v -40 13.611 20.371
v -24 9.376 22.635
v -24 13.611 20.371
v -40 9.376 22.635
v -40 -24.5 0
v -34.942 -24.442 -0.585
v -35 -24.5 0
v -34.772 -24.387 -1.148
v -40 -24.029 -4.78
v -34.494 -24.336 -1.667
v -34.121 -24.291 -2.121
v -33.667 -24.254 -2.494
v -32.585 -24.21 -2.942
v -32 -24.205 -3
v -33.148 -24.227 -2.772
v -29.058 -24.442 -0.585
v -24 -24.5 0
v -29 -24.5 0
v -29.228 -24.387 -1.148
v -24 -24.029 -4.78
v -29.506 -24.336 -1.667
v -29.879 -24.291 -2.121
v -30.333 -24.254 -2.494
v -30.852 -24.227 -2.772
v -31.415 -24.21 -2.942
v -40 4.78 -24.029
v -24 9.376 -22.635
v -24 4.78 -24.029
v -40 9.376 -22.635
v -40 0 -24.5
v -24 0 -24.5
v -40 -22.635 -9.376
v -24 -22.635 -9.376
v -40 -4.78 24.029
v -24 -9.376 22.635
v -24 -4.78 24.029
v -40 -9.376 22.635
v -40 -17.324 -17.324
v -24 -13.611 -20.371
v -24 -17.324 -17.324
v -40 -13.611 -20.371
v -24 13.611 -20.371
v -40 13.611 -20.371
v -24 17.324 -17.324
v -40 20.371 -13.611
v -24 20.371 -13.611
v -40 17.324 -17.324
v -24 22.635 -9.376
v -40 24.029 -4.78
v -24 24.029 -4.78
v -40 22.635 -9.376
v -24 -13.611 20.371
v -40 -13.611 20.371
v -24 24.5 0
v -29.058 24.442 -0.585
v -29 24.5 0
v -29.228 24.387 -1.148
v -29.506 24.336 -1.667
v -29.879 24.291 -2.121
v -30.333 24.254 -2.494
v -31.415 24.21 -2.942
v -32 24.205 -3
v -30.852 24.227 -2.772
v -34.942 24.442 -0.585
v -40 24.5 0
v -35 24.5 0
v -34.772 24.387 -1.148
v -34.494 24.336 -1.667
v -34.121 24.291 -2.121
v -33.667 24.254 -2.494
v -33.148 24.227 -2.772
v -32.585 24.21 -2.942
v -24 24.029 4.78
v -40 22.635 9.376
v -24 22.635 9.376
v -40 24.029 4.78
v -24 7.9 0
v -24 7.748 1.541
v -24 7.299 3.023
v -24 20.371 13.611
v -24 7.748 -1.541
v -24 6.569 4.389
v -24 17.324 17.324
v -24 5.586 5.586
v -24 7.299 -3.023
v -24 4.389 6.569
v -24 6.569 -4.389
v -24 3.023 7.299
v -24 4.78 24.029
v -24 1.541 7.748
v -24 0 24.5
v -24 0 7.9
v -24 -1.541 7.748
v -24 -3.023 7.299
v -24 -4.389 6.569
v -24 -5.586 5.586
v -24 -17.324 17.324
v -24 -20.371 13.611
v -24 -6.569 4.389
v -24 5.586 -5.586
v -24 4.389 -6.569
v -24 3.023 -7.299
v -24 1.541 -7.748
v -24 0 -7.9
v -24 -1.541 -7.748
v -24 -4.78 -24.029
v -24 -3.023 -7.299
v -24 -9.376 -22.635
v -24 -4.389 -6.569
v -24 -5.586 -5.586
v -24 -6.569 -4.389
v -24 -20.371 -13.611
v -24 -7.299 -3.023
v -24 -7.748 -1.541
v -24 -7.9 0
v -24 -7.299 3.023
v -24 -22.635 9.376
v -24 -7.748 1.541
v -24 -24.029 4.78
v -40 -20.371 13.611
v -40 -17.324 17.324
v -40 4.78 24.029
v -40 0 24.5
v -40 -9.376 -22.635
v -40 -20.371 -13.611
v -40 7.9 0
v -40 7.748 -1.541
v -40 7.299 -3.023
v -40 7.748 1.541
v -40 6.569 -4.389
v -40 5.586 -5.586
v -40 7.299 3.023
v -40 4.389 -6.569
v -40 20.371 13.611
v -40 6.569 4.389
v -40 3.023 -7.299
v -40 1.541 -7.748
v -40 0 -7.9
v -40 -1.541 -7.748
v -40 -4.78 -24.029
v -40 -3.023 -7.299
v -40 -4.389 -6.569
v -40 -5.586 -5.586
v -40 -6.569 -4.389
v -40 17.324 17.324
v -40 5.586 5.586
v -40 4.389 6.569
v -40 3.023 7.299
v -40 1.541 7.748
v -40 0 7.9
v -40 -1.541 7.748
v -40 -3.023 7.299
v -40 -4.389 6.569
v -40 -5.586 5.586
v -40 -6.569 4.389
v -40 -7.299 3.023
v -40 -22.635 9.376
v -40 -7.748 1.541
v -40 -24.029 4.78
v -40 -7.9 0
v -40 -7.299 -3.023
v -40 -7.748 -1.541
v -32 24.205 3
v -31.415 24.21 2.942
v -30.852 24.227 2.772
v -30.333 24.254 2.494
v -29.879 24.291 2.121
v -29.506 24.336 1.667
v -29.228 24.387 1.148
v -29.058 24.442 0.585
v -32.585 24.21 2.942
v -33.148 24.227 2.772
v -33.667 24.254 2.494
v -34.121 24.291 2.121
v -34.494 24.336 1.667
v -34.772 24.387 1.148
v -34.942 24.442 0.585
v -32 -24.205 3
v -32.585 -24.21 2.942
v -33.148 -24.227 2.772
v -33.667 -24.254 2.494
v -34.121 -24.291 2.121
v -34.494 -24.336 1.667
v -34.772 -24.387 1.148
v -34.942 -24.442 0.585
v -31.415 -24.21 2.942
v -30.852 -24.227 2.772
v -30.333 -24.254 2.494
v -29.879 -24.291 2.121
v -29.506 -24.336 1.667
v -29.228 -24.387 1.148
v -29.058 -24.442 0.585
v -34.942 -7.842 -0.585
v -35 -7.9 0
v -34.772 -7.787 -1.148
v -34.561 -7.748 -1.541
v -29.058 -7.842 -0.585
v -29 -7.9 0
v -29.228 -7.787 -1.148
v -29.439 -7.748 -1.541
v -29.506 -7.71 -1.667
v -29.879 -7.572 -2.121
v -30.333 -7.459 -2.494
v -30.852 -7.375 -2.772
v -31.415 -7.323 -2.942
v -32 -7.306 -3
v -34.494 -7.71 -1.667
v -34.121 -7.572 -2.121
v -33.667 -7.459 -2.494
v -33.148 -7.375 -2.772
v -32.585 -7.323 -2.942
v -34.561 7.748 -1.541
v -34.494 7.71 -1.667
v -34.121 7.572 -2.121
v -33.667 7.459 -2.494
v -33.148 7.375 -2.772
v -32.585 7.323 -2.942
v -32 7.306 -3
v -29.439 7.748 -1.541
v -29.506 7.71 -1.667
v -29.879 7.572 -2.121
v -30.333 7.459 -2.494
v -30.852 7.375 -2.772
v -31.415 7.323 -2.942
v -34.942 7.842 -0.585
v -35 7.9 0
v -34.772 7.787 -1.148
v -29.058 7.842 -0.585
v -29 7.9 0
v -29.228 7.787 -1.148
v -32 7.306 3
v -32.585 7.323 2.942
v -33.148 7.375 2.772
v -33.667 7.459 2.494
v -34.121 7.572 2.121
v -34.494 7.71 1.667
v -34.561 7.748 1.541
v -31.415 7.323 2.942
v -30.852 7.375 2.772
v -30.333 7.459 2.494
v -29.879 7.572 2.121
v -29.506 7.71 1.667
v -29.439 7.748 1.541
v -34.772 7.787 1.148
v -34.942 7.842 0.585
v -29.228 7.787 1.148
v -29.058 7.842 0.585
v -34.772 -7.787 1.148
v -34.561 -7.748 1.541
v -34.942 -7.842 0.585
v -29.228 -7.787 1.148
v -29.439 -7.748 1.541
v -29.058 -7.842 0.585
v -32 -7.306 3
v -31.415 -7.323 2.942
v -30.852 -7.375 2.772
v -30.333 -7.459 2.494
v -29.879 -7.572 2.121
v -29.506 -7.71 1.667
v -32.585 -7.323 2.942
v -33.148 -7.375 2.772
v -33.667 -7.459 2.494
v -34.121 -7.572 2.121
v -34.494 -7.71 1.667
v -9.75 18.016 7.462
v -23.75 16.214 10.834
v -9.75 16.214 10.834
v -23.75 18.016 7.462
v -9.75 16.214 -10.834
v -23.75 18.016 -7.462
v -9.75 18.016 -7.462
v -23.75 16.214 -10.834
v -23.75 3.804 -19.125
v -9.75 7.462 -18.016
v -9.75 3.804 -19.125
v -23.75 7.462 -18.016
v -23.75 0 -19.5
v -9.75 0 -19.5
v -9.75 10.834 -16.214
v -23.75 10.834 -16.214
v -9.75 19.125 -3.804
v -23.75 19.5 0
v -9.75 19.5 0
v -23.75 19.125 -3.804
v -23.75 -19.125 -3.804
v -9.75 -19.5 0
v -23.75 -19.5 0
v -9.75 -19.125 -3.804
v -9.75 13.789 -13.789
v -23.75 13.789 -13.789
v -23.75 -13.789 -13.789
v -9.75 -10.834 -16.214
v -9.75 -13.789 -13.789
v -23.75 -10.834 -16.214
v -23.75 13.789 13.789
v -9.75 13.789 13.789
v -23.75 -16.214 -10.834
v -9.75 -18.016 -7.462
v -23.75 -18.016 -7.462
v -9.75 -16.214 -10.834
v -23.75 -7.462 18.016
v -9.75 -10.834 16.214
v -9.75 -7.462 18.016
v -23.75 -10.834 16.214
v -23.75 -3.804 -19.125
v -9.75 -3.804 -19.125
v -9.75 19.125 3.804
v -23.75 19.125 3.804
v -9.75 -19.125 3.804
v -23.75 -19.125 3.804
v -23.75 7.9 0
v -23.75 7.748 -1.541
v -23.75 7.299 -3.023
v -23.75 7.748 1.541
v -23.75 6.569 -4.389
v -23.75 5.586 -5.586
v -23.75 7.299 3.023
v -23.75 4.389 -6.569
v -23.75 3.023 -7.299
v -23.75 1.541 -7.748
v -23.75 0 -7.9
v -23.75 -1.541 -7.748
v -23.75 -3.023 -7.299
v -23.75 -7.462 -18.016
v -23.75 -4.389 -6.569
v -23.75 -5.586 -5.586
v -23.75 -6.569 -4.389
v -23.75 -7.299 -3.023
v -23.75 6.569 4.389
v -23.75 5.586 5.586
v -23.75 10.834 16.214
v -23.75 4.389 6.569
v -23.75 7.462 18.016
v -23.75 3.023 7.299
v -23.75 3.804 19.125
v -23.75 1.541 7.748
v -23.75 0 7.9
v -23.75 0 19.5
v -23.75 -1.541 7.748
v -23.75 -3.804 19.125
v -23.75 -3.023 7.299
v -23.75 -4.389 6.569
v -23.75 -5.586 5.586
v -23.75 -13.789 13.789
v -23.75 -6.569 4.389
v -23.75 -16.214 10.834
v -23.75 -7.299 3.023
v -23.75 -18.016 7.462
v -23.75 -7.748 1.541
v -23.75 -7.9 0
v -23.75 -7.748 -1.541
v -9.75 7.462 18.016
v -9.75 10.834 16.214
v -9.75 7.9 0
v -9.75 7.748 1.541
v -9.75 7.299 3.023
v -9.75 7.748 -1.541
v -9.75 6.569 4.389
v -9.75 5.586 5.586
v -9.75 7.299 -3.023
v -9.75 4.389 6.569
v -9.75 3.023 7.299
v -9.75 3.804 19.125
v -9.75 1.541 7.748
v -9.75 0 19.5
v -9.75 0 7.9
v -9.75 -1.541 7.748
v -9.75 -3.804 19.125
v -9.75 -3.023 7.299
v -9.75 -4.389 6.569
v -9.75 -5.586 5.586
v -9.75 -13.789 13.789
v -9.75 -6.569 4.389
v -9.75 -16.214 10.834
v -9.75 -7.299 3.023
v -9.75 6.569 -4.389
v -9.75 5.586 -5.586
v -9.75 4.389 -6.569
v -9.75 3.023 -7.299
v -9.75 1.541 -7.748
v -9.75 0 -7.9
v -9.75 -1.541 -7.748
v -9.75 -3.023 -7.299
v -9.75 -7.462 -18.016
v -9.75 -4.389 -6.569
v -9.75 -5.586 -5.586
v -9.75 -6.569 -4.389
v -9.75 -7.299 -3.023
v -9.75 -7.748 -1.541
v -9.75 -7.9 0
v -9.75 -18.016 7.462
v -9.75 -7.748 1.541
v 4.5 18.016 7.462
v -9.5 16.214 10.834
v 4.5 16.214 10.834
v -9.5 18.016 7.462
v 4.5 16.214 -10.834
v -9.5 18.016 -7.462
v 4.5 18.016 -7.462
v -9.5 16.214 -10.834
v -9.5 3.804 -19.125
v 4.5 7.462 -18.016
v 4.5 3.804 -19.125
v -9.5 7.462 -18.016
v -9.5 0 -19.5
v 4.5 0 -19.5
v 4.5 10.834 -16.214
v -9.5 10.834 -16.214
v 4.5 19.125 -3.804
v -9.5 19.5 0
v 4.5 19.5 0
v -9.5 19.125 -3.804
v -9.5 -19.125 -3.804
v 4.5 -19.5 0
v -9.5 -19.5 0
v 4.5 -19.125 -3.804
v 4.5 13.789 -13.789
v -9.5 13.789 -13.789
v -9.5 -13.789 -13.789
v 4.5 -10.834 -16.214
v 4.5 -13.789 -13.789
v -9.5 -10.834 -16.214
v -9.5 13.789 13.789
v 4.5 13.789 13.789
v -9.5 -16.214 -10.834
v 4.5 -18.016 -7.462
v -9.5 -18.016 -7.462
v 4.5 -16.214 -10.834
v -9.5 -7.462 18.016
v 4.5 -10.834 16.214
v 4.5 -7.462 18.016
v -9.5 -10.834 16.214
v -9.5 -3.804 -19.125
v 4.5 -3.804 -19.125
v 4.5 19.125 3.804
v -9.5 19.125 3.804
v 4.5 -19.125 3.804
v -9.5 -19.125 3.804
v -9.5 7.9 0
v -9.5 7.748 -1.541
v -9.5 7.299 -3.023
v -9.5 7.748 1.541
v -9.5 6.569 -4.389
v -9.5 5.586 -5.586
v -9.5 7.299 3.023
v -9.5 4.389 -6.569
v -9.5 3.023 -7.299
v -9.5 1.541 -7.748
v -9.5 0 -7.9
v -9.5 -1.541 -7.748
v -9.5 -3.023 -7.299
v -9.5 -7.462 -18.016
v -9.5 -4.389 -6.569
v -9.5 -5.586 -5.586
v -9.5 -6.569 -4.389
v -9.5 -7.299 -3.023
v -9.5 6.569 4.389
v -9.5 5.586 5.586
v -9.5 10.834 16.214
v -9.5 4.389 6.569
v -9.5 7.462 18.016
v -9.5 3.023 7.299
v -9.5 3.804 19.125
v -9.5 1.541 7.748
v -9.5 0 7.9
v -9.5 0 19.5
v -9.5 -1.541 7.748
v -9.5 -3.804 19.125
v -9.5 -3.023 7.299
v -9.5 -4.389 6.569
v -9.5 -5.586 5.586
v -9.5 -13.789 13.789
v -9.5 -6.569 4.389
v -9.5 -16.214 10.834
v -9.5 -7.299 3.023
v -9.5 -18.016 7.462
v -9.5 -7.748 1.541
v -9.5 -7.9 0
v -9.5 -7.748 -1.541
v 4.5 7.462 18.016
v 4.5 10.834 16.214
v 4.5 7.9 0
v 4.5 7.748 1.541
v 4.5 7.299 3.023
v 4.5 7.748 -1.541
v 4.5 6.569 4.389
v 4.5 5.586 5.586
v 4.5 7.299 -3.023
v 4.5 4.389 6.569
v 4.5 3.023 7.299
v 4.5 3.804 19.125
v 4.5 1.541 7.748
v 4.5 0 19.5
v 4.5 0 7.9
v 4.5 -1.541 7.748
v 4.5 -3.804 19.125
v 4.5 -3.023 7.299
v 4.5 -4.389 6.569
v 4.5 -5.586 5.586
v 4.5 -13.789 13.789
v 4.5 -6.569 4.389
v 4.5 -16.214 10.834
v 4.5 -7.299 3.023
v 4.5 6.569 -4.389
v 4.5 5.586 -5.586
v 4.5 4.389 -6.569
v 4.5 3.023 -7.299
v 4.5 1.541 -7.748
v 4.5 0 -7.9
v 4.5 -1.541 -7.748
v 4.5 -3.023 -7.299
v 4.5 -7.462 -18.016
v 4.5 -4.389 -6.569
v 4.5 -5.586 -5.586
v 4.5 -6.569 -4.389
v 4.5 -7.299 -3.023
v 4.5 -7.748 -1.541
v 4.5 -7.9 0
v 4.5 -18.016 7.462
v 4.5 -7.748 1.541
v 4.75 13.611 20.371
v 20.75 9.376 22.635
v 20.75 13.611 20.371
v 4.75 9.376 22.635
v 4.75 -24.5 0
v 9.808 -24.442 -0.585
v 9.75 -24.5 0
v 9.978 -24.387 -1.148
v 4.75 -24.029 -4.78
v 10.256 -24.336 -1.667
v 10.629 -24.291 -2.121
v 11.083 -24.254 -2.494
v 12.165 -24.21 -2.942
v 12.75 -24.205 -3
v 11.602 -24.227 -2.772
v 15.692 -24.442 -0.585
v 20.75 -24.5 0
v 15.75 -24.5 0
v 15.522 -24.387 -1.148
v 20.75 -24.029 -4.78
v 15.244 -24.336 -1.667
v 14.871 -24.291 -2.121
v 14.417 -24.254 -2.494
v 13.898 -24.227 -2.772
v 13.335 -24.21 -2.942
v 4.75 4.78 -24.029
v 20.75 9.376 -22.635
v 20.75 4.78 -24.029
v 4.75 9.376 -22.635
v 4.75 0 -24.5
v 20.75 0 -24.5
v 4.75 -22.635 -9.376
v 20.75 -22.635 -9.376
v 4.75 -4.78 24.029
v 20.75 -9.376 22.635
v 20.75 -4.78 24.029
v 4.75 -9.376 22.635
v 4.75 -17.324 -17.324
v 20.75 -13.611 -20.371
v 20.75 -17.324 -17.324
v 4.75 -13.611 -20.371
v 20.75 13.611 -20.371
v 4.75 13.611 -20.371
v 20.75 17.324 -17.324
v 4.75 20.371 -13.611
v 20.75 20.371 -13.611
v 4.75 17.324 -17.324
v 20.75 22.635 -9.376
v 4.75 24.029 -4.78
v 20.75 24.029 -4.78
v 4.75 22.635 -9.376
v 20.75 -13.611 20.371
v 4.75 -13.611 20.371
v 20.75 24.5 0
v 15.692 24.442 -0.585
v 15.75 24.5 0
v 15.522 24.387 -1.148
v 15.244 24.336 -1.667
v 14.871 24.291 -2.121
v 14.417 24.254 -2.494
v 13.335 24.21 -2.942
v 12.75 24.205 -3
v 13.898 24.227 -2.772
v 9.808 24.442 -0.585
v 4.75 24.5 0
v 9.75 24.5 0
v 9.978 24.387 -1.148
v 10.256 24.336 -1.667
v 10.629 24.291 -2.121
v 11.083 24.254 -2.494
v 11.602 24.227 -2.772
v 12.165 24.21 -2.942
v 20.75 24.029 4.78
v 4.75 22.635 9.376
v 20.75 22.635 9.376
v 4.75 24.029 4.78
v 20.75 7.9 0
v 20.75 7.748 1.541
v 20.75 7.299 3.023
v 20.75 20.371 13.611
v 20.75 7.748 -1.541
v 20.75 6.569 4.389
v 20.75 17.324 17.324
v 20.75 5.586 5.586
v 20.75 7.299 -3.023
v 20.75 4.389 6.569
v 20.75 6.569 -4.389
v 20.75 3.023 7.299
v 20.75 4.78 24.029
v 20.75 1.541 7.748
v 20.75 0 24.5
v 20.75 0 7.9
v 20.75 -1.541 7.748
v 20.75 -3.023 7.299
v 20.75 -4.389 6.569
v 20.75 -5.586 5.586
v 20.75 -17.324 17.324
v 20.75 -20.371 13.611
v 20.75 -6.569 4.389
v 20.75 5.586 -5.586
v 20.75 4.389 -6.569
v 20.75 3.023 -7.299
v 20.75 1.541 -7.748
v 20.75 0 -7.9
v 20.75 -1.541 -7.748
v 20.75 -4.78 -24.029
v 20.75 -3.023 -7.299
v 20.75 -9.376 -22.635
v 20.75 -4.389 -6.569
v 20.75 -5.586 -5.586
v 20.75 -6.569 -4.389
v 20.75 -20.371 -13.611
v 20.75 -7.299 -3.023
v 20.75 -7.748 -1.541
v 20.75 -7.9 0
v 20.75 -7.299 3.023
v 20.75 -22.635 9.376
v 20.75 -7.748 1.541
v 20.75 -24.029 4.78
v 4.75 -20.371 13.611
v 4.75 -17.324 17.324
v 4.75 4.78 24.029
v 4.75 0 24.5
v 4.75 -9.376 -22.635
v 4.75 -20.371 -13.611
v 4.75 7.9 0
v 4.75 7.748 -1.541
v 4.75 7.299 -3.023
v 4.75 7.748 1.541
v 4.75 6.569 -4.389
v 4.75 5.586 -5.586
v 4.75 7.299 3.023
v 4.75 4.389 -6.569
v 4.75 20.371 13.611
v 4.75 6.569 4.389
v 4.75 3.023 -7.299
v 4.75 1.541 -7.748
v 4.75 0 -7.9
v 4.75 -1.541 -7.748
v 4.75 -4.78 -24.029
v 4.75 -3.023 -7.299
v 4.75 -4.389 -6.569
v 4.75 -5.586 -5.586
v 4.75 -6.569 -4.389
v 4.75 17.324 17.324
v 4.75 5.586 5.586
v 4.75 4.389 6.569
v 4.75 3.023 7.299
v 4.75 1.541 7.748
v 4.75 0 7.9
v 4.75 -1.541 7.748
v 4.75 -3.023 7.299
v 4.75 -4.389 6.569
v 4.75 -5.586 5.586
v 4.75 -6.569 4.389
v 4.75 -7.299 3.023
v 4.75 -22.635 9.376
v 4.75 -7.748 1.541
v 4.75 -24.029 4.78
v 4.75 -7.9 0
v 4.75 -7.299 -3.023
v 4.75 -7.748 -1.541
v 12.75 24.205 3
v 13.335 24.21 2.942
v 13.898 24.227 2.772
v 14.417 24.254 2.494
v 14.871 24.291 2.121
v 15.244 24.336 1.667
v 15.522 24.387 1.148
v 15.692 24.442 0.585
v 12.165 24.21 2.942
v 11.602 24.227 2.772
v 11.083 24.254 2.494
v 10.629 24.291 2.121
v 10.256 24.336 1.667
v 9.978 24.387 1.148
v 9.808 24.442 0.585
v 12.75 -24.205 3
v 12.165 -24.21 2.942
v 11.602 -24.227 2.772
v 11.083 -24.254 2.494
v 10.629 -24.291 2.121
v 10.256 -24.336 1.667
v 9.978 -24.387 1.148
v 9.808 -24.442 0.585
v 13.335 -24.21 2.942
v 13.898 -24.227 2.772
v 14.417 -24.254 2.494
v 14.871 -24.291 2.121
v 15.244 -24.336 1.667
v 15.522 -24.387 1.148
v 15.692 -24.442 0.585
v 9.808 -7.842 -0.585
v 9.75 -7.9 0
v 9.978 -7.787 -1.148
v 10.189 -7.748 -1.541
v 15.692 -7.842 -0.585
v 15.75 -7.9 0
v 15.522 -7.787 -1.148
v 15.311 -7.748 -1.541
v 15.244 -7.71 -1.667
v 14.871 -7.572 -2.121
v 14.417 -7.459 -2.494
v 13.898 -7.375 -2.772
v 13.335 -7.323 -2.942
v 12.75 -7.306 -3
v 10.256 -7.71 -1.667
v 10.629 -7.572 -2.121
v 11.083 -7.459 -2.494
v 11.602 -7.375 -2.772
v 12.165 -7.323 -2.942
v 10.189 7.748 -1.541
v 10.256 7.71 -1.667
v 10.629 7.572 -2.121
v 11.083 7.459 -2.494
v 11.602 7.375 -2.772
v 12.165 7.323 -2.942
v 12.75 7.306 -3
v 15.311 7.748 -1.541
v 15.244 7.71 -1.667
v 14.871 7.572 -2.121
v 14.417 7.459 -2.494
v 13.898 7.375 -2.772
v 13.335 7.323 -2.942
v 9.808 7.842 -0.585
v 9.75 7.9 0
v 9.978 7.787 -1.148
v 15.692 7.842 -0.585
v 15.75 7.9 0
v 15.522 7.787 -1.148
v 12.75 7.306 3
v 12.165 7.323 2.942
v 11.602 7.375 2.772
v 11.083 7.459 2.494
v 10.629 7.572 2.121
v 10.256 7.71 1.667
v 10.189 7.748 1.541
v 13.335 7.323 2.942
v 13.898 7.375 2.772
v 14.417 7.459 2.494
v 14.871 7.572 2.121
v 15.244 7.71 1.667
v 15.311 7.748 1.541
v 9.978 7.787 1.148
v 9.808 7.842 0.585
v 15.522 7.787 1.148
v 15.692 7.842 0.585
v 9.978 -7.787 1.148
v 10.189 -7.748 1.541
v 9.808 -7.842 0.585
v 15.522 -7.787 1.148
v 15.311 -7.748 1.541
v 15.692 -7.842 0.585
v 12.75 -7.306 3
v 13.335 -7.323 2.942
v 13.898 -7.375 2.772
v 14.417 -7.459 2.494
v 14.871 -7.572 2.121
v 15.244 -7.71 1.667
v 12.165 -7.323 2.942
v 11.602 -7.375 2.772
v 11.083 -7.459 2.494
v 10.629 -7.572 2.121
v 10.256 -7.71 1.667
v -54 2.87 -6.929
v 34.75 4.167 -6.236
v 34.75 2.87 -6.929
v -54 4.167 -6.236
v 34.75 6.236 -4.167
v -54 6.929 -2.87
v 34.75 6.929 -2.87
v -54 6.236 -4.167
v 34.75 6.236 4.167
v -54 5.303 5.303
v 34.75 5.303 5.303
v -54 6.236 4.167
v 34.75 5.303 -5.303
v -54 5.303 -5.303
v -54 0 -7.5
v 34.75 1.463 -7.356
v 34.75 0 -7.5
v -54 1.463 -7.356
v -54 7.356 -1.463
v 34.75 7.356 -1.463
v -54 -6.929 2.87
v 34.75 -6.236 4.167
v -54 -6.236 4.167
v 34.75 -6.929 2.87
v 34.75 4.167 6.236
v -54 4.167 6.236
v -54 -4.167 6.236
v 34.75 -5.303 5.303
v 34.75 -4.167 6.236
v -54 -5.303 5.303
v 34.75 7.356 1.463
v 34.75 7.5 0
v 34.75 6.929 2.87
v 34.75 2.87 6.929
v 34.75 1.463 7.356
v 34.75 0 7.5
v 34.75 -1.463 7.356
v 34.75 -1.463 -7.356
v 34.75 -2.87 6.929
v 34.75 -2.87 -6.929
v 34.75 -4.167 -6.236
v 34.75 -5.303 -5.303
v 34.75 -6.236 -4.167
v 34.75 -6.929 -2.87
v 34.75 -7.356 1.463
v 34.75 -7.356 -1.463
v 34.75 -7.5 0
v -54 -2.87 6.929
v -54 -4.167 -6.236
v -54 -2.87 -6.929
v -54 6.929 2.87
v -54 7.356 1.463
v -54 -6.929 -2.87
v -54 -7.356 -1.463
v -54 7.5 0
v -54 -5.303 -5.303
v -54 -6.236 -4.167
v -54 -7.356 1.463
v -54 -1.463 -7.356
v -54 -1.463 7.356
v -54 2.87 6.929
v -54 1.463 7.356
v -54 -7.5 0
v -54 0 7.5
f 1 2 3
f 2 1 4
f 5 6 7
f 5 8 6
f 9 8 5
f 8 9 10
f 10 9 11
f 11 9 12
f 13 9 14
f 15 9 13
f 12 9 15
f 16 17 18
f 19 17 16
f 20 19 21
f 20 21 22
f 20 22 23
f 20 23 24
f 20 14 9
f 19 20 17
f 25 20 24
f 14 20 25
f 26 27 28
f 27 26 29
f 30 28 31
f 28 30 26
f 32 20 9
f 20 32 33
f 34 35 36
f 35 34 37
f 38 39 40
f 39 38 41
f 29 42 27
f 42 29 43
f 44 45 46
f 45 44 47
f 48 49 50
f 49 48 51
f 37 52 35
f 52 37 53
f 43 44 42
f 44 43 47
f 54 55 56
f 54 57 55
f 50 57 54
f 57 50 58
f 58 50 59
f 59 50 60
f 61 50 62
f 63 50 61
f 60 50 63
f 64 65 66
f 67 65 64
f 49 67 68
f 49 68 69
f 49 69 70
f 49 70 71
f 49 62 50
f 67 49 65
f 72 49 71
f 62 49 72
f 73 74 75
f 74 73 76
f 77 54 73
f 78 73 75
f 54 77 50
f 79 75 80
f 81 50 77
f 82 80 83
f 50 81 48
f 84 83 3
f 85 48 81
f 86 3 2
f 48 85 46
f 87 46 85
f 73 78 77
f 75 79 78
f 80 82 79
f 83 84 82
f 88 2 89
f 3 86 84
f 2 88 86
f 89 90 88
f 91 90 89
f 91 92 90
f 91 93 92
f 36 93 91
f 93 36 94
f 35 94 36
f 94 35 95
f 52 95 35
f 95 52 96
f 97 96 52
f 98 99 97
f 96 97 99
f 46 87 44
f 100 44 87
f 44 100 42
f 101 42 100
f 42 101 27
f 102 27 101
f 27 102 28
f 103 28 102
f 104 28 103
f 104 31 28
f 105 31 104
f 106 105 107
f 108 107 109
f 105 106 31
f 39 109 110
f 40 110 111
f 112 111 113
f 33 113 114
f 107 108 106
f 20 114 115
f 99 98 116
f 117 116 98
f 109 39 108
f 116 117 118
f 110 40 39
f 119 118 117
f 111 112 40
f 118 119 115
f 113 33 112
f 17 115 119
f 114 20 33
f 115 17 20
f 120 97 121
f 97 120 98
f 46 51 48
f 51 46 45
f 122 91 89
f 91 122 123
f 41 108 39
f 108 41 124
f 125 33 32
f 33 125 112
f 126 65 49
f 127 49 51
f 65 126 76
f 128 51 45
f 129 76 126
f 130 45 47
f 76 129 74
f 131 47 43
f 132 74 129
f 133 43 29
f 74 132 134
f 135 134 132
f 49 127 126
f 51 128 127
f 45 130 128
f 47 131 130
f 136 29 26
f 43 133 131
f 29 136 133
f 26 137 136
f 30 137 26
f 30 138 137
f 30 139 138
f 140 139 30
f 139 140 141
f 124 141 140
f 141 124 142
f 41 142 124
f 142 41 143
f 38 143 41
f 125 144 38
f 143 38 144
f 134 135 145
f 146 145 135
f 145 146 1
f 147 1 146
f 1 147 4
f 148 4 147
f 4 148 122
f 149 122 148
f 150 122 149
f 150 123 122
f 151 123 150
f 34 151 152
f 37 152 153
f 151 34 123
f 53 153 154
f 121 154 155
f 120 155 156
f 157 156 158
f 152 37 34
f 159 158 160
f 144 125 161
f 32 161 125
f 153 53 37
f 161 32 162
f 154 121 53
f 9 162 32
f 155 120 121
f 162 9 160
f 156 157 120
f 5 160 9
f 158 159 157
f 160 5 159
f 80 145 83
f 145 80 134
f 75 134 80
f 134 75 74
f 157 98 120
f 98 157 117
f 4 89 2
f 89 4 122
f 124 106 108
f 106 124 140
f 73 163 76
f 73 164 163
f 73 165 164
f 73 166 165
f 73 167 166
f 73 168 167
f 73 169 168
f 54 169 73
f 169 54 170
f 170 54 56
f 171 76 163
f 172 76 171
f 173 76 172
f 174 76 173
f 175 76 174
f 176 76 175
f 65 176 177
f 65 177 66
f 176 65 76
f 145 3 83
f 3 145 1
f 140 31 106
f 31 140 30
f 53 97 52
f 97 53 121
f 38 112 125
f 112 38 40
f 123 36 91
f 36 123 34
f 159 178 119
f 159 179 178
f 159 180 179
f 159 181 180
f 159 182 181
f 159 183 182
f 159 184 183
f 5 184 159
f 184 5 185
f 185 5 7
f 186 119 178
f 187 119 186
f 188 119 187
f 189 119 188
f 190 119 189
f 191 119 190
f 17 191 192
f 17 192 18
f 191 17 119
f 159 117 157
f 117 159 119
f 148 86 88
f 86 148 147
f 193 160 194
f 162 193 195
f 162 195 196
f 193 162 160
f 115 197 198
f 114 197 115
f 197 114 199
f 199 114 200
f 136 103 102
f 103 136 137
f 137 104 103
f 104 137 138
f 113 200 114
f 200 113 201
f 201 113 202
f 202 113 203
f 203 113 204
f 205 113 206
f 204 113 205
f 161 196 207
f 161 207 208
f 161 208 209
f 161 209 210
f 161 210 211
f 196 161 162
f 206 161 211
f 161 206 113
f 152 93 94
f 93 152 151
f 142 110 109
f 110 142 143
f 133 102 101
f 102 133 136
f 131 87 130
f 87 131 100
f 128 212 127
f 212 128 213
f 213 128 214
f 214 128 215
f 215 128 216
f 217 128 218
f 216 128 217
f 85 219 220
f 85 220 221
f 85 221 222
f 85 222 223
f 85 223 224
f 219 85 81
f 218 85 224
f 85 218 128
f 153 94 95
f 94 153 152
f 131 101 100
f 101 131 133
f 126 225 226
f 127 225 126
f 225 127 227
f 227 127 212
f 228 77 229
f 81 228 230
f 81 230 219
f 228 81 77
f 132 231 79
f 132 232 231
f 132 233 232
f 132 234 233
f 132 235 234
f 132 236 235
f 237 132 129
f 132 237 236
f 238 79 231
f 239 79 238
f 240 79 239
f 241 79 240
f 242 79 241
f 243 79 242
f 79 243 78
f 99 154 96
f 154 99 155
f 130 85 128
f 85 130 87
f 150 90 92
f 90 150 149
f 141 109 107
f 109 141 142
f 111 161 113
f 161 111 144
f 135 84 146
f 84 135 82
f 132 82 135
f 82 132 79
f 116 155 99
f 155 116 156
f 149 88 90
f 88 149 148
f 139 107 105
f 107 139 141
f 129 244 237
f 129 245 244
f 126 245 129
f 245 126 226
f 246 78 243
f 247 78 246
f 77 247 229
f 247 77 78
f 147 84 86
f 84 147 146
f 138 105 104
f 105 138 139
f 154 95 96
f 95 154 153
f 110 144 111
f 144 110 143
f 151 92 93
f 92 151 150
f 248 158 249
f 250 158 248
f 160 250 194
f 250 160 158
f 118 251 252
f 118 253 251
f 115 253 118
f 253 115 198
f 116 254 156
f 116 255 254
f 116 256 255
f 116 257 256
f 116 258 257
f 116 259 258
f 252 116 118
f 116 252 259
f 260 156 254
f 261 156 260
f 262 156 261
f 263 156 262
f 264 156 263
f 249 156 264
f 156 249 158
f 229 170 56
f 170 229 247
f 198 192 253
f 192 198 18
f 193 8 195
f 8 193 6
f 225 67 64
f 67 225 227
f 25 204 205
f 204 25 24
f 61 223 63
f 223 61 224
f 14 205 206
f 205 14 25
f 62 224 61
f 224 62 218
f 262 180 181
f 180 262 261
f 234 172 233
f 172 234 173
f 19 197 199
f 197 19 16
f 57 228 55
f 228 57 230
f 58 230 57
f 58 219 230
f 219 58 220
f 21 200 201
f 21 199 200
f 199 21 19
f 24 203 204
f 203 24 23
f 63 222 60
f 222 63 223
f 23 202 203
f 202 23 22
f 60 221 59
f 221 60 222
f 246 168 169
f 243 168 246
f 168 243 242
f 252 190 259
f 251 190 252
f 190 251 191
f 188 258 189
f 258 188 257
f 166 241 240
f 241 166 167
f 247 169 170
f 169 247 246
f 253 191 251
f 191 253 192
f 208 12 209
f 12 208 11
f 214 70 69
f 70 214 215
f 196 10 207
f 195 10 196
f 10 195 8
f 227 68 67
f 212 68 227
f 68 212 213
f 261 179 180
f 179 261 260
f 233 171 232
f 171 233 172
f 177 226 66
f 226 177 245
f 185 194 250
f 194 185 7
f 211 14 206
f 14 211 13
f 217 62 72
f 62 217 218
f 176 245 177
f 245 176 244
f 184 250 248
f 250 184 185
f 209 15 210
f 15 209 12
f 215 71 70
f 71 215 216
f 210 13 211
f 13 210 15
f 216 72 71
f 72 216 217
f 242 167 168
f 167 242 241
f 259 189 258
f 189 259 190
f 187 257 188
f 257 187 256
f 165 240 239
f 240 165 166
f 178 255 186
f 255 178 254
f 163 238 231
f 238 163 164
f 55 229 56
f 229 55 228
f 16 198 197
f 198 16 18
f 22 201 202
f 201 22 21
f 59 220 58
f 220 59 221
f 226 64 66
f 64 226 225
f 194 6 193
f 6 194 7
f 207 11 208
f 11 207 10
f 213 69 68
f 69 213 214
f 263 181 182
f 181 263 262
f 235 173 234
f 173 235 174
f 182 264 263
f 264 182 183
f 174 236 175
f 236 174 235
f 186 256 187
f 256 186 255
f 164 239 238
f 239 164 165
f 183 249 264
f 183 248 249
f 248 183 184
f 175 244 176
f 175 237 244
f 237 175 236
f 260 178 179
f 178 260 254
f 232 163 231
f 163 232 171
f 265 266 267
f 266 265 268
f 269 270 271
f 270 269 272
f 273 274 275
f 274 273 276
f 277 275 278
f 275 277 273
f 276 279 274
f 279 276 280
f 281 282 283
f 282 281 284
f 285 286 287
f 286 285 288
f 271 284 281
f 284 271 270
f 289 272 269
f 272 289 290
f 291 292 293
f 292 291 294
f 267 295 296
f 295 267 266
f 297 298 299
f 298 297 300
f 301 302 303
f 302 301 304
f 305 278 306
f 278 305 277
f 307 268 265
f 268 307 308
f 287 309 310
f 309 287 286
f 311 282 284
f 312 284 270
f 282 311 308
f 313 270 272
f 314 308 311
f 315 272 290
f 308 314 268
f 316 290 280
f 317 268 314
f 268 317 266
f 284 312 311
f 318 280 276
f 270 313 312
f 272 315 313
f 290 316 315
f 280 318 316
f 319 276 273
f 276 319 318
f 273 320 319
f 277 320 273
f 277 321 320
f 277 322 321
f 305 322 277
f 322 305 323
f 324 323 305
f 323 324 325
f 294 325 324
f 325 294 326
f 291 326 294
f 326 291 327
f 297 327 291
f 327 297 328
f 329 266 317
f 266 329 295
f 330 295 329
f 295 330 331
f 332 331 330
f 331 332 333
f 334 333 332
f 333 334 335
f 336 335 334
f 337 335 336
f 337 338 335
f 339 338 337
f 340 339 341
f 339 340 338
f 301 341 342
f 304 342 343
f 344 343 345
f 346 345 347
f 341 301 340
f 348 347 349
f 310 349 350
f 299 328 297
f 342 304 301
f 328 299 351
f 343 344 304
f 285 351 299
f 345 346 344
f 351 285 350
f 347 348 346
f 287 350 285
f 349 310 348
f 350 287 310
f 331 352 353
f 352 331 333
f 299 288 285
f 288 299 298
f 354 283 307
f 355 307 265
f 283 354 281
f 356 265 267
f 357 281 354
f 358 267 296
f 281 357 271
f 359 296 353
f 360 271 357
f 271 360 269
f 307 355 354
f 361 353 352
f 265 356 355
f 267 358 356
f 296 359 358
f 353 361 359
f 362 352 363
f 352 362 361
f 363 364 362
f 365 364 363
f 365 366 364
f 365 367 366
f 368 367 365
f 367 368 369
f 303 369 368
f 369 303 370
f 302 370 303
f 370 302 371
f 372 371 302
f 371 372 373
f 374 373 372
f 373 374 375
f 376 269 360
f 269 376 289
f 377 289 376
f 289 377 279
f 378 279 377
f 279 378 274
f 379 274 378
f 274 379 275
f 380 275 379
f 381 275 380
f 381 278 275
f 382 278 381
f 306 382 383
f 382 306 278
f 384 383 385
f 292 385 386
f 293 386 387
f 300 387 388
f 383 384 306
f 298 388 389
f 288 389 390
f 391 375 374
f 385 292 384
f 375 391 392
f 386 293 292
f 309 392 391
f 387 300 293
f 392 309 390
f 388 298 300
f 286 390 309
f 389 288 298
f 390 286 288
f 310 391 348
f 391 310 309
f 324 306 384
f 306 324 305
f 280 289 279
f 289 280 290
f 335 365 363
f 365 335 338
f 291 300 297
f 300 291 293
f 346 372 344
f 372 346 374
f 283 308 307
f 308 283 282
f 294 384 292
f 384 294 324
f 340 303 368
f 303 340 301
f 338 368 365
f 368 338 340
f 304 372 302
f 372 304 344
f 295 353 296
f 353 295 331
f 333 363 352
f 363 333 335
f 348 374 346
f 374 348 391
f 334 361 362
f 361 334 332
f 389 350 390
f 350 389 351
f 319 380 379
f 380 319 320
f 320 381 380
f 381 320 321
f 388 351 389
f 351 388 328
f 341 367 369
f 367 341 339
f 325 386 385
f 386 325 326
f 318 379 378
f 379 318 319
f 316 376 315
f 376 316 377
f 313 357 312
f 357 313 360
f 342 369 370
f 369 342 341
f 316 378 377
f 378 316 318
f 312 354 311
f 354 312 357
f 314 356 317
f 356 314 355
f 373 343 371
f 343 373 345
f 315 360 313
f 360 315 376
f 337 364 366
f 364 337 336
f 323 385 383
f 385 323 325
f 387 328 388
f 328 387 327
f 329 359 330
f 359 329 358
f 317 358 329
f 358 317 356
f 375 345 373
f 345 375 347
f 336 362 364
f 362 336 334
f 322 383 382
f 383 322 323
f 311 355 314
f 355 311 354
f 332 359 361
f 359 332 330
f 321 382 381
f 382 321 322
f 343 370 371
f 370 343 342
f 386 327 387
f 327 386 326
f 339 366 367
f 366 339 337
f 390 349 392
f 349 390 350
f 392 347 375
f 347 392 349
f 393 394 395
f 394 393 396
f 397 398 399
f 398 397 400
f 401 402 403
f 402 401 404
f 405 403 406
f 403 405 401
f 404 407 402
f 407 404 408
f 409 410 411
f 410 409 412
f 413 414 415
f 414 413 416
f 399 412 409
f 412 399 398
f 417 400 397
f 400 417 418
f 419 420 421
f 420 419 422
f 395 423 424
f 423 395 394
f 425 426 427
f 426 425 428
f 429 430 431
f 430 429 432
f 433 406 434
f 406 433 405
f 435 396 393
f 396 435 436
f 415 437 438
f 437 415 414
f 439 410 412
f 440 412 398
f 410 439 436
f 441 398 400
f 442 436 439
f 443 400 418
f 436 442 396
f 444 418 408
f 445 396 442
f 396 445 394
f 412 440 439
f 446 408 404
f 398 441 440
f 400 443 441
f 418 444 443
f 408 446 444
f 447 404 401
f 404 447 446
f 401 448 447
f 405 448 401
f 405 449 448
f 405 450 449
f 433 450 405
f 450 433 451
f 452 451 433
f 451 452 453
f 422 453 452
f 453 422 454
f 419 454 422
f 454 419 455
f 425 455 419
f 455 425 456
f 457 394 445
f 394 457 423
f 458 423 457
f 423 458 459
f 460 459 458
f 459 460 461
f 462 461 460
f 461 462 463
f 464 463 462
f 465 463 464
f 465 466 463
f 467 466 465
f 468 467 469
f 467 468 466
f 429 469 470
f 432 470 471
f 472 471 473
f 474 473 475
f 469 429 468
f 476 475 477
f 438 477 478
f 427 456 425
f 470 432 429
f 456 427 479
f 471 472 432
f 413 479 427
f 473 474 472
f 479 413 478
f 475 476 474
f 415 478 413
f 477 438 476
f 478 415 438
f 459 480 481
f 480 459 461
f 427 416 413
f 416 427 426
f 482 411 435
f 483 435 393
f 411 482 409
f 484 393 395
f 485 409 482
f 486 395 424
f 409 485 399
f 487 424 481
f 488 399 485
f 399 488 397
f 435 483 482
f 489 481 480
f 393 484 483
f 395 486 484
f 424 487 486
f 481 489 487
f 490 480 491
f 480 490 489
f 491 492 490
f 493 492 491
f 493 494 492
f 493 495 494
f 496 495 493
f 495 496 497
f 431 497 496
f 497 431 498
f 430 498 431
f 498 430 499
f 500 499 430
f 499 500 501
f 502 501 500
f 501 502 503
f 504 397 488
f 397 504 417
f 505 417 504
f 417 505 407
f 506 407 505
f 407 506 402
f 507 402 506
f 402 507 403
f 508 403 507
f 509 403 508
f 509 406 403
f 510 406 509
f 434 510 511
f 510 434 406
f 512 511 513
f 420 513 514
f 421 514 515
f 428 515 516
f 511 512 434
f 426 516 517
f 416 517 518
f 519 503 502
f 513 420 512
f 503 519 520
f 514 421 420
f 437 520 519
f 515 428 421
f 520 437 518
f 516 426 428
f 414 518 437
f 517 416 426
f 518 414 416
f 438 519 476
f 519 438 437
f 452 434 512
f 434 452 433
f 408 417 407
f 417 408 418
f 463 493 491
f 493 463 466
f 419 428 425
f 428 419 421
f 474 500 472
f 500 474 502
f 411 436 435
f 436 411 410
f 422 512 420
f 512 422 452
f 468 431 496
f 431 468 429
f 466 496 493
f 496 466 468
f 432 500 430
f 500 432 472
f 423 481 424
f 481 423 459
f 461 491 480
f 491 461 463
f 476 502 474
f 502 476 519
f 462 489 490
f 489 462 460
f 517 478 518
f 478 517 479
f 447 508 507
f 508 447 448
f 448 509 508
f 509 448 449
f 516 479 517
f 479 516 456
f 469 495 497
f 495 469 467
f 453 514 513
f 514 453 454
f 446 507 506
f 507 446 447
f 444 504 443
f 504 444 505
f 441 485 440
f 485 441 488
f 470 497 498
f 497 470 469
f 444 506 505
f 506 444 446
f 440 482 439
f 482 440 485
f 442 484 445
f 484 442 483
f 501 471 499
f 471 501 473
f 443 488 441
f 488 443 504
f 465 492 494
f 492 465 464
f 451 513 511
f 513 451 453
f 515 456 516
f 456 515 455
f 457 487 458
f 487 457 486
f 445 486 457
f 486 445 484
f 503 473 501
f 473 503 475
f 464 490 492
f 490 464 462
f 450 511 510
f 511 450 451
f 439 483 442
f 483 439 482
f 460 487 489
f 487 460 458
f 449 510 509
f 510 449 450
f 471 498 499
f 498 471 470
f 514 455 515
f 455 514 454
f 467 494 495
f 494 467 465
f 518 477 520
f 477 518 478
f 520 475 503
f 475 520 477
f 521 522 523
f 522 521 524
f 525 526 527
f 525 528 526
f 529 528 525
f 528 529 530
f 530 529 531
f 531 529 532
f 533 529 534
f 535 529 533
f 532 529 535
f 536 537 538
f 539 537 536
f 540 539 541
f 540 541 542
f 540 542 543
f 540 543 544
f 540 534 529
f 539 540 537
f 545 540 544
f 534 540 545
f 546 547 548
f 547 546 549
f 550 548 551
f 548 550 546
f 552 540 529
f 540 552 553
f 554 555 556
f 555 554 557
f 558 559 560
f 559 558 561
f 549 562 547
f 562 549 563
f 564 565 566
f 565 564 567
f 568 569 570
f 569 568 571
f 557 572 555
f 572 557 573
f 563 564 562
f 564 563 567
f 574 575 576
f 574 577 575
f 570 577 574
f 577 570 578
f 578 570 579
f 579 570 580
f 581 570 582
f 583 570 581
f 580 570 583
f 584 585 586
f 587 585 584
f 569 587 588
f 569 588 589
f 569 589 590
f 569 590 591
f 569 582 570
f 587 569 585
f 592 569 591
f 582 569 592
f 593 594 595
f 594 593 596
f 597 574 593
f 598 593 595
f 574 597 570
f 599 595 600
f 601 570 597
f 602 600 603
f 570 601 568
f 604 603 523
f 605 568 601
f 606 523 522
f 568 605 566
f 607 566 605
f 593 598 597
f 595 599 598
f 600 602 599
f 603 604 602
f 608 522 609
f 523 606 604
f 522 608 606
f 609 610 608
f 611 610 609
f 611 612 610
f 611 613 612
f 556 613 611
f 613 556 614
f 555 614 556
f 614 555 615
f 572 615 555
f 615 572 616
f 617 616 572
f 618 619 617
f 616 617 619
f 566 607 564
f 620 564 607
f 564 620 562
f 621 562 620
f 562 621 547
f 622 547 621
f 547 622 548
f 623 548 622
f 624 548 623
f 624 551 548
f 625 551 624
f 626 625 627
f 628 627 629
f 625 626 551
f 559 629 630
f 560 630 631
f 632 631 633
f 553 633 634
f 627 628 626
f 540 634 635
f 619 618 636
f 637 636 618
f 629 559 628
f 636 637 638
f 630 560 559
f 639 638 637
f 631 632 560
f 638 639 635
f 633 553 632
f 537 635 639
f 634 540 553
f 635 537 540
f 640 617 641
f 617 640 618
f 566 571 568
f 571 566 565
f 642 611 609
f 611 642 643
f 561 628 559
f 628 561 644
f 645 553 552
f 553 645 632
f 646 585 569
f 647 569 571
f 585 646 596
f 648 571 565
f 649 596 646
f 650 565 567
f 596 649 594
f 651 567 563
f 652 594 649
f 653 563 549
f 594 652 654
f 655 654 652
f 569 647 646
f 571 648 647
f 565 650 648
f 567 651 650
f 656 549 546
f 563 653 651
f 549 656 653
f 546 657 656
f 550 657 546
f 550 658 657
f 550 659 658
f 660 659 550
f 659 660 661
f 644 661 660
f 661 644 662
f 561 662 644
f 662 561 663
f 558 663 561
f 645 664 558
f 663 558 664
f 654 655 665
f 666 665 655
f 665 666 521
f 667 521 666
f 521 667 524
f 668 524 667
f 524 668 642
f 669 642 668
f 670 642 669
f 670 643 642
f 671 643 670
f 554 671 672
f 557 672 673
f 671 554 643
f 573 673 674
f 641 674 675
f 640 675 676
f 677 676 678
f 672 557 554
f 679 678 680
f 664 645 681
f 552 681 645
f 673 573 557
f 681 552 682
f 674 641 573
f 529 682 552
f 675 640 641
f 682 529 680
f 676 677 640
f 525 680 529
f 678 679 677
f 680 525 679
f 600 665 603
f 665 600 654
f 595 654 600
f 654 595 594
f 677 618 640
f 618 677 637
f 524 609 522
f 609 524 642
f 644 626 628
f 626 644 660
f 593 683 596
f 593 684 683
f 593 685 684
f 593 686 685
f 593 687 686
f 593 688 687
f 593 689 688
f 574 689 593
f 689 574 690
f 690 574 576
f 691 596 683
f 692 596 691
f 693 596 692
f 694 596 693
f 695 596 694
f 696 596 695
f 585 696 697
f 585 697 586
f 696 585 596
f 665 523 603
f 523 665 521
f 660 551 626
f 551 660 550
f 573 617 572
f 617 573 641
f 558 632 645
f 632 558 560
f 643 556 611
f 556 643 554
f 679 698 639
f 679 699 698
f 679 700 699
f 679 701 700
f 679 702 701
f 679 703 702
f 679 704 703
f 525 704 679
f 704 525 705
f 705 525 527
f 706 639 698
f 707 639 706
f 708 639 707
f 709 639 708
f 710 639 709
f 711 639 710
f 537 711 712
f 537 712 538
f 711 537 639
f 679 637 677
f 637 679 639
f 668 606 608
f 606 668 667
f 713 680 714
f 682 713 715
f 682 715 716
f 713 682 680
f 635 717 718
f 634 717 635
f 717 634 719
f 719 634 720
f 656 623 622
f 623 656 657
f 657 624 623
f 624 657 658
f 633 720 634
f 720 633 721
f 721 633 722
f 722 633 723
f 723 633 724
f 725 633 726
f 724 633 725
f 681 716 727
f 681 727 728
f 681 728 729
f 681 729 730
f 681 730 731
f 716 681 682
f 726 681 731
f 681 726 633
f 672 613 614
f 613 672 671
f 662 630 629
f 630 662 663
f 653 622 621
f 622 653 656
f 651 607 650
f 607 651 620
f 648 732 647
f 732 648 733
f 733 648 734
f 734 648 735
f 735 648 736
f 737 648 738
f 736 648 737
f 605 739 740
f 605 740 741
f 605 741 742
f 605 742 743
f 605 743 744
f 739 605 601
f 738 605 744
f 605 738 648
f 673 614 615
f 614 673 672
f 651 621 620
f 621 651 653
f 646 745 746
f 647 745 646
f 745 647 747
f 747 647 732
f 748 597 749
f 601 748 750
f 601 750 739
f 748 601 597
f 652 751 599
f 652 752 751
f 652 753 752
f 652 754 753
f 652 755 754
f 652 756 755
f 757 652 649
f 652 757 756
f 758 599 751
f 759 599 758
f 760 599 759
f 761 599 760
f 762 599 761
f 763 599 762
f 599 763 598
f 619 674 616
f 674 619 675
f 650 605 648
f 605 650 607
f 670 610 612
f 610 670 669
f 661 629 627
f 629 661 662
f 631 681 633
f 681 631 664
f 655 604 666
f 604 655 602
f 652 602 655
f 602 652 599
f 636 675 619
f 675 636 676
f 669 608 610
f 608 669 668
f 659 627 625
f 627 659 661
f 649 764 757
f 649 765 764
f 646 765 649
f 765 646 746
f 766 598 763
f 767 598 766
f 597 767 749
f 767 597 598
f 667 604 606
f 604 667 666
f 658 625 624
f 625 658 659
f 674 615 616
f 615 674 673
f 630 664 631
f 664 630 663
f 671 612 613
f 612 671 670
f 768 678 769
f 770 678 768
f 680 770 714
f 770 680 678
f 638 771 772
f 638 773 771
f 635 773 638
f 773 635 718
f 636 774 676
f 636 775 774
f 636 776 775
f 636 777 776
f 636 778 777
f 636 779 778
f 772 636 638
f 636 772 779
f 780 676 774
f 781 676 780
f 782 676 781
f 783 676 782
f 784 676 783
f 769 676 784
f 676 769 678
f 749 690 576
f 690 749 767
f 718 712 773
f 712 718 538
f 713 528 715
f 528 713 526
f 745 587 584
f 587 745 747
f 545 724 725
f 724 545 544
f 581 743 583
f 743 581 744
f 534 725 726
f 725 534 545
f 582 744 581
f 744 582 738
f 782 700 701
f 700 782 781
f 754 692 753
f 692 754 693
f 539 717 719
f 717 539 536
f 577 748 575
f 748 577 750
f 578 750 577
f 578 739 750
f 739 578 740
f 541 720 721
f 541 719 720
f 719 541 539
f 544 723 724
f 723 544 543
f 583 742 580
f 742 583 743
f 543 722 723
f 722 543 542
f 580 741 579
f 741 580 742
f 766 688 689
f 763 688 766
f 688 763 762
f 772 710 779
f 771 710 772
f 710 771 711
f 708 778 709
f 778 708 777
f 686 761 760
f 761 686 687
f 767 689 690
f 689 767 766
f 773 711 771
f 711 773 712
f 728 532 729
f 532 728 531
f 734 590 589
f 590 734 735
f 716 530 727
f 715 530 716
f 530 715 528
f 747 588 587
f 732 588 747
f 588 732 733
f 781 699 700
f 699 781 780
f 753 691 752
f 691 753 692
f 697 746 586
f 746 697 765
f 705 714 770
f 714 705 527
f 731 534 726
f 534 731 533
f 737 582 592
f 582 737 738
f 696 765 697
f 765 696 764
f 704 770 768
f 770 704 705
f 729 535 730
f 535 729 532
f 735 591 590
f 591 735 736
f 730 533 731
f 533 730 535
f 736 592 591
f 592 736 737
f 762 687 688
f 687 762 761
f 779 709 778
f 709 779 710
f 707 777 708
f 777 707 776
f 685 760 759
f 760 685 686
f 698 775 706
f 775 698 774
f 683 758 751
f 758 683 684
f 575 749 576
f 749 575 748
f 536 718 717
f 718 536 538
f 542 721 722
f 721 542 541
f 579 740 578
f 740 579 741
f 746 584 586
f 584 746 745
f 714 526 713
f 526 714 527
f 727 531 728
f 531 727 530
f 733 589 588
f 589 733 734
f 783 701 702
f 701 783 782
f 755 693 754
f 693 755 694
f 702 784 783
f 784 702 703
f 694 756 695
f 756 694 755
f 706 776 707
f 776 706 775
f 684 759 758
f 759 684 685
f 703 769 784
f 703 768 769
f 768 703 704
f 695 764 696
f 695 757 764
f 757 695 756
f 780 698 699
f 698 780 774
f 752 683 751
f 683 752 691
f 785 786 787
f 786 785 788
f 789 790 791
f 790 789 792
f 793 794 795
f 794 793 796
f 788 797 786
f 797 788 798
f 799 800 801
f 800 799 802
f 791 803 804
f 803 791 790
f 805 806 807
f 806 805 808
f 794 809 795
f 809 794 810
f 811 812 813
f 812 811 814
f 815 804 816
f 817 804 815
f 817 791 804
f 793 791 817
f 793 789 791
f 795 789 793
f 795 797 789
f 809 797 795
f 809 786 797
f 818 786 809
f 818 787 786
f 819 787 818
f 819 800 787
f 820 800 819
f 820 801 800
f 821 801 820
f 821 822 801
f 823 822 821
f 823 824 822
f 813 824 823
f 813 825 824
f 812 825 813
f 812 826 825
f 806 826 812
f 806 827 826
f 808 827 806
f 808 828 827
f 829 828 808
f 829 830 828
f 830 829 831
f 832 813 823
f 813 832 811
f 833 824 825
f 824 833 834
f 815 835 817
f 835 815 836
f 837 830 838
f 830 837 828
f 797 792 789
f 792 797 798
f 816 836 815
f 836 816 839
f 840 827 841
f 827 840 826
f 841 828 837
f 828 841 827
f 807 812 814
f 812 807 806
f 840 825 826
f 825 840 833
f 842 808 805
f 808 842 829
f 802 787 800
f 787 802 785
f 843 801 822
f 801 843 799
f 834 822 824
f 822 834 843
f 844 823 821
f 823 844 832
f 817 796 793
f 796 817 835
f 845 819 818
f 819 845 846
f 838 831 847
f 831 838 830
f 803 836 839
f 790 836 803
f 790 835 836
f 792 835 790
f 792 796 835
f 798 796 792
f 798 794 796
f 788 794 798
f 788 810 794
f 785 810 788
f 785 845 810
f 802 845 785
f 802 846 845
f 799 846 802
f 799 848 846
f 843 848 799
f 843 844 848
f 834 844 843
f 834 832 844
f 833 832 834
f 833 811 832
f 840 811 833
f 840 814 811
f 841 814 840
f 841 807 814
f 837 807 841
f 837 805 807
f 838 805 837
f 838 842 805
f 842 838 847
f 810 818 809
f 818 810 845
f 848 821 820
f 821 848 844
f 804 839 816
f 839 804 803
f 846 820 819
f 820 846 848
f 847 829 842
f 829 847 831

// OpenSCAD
$fn = 32;

// ------------------------------------------------------------------------
// Shaft with rings and collars: d15 shaft, 4 rings
// Every part is its own module, assembly() places them once.
// ------------------------------------------------------------------------

// --- part 1 ---
module shaft() {
  translate([0, 0, -44.375]) cylinder(h = 88.75, d = 15);
}

// --- part 2 ---
module collar_a() {
  difference() {
    cylinder(h = 16, d = 49);
    translate([0, 0, -1]) cylinder(h = 18, d = 15.8);
    translate([0, 0, 8]) rotate([90, 0, 0]) cylinder(h = 51, d = 6, center = true);
  }
}

// --- part 3 ---
module spacer_a() {
  difference() {
      translate([0, 0, 0]) cylinder(h = 14, d = 39);
      translate([0, 0, -1]) cylinder(h = 16, d = 15.8);
    }
}

// --- part 4 ---
module spacer_b() {
  difference() {
      translate([0, 0, 0]) cylinder(h = 14, d = 39);
      translate([0, 0, -1]) cylinder(h = 16, d = 15.8);
    }
}

// --- part 5 ---
module collar_b() {
  difference() {
    cylinder(h = 16, d = 49);
    translate([0, 0, -1]) cylinder(h = 18, d = 15.8);
    translate([0, 0, 8]) rotate([90, 0, 0]) cylinder(h = 51, d = 6, center = true);
  }
}

// --- assembly ---
module assembly() {
  translate([-9.625, 0, 0]) rotate([0, 90, 0]) shaft();
  translate([-40, 0, 0]) rotate([0, 90, 0]) collar_a();
  translate([-23.75, 0, 0]) rotate([0, 90, 0]) spacer_a();
  translate([-9.5, 0, 0]) rotate([0, 90, 0]) spacer_b();
  translate([4.75, 0, 0]) rotate([0, 90, 0]) collar_b();
}

assembly();
